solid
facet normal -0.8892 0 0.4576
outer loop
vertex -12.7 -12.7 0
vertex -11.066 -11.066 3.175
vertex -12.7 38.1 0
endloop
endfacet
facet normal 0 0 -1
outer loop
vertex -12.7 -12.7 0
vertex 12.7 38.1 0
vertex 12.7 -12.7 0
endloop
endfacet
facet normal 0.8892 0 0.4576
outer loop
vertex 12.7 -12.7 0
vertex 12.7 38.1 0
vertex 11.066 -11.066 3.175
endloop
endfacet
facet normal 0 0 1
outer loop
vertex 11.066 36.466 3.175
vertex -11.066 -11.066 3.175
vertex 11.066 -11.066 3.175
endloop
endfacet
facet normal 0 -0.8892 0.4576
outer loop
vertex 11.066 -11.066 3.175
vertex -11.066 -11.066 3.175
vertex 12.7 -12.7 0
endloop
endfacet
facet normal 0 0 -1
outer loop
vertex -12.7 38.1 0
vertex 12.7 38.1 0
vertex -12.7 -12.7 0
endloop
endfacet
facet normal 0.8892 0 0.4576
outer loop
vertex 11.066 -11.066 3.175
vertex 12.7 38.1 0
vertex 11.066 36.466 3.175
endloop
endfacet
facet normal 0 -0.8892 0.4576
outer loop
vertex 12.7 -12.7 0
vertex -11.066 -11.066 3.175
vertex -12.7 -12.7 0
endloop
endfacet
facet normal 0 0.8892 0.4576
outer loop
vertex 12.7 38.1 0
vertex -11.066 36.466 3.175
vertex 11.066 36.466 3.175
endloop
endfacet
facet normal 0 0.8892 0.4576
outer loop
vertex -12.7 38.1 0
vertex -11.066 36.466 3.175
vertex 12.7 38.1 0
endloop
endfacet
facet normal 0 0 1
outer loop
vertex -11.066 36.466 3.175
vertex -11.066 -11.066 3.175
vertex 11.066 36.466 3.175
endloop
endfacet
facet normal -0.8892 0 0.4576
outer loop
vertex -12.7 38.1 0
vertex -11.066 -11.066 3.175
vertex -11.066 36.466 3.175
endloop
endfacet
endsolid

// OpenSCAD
//Base Generator for Miniature Wargamers

//Measurements in milimeters or inches?
units=1; // [0:millimeters, 1:inches]
//how wide in mm should the base be?
base_width = 1;
//how deep should the base be? must be equal to or greater than width
base_depth = 2;
//how tall should the base be?
base_height = .125;
//What angle should the sides be? 70 is a good value; use 90 for straight sides
angle= 70;
//what shape?
shape=4; // [4:rectangle, 6:octangle, 80:lozenge]
/* [Base Slot] */
//What kind of slot?
slot_type=0; // [0:none, 1:end to end, 2:corner to corner, 3:end-to-end double]
//How long is the slot?
slot_length = .5;
//How wide is the slot?
slot_width = .09;
//For offset slots, how deep is the offset? (required for double slots)
slot_offset = 0;
/* [Base Indent] */
//% to indent the top surface? (0 for no indent)
base_indent=0;
//% of top surface to indent?
base_indent_area=95;
/* [Central Hole] */
//what shape?
hole_shape=0; // [0:none, 4:diamond, 6:hexagon, 80:round]
//hole diameter?
hole_radius=.35;
/* [Nameplate] */
//What kind of nameplate?
nameplate_type=0; // [0:none, 1:nameplate lengthwise]
//How long is the nameplate?
nameplate_length = 1.5;
//How wide is the nameplate?
nameplate_width = .3;
//Offset how far from the center?
nameplate_offset = .3;
/* [Number of Bases] */
// Number of rows of bases
rows = 1; // [1:10]
// Number of columns of bases
columns = 1; // [1:10]



module base(width, depth, height, side_angle, sides, bslot, slength, swidth, sback, bindent, biarea, hshape, hradius, ntype, nlength, nwidth, noffset)
{

/* [Hidden] */
  $fa=0.5; // default minimum facet angle
  $fs=0.5; // default minimum facet size
  convf = 25.4; // inches to mm

// conversions to metric (if needed)

  bh = units ? height * convf : height;
  bw = units ? width * convf : width;
  bd = units ? depth * convf : depth;
  sl = units ? slength * convf : slength;
  sw = units ? swidth * convf : swidth;   
  sb = units ? sback * convf : sback;   
  hr = units ? hradius * convf : hradius;
  nl = units ? nlength * convf : nlength;
  nw = units ? nwidth * convf : nwidth;   
  npo = units ? noffset * convf : noffset;     
  
// if rectangle, rotate from diamond to rectangle    
    
  rangle = sides == 4 ? 45 : 0;
    
  inset = bh/tan(angle);
  radius1 = sides == 4 ? sqrt(2) * bw / 2 : bw/2;
  radius2 = radius1 - inset * 2;
  diff = sides == 6 ? bd - (sqrt(3) * radius1) : bd - bw;
  offset1 = sides == 4 ? sqrt((diff * diff)/2): 0;
  offset2 = sides == 4 ? sqrt((diff * diff)/2): diff;
  
  
  // slot variables
   
  sangle = (bslot == 2) ? atan(bw/bd) : 0; // angle of slot
  slot_offset = (sb) ? (sides == 4) ? sqrt((sb * sb)/2) : sb : 0;
  
  
  doff = (sides == 6) ? bd/2 - (sqrt(3) * radius1)/2 : bd/2 - bw/2;
  
 
  soffset_x = sqrt(((doff - slot_offset) * (doff - slot_offset))/2);
  soffset_y = sqrt(((doff + slot_offset) * (doff + slot_offset))/2);
  
  np_offset = sqrt(((npo) * (npo))/2);
  
  rotate(rangle)
  {
      difference()
      {
        hull()
        {
        cylinder(r1=radius1, r2=radius2, h=bh, $fn=sides);
        translate([offset1,offset2,0])
          cylinder(r1=radius1, r2=radius2, h=bh, $fn=sides);      
        }

        if (bslot) // if base slot
        {
          if (sides==4)
          {
          translate([soffset_x,soffset_y,bh / 2])        
            color([0,0,1])
              rotate(sangle - 45)
                cube([sw,sl, bh + 4], center=true);
          }
          else
          {
             translate([0 - slot_offset,doff,bh / 2])        
               color([0,0,1])
                 rotate(sangle)
                   cube([sw,sl, bh + 4], center=true);              
          }
        }
        if (bslot == 3) // if double slot
          {
            if (sides == 4)
              translate([soffset_y,soffset_x,bh / 2])
                color([0,0,1])
                  rotate(sangle - 45)
                    cube([sw,sl, bh + 4], center=true);        
            else
              translate([slot_offset, doff, bh / 2])
                color([0,0,1])
                  cube([sw,sl, bh + 4], center=true);              
          }
        if (bindent) // if indented top
          {
            if (sides == 4)
            {
              translate([0,0,bh * (100 - bindent)/100])
                color([0,0,1])
                    hull()
                    {
                      cylinder(r1=radius2 * (biarea)/100, r2=radius2 * (biarea)/100, h=bh, $fn=sides);
                      translate([offset1,offset2,0])
                        cylinder(r1=radius2 * (biarea)/100, r2=radius2 * (biarea)/100, h=bh, $fn=sides);  
                    }
            }    
            else
              translate([0, 0, bh * (100 - bindent)/100])
                color([0,0,1])
                  hull()
                  {
                    cylinder(r1=radius2 * (biarea)/100, r2=radius2 * (biarea)/100, h=bh, $fn=sides);
                    translate([offset1,offset2,0])
                      cylinder(r1=radius2 * (biarea)/100, r2=radius2 * (biarea)/100, h=bh, $fn=sides);              }
          }    
          if (hshape) // if central hole
          {
            if (sides == 4)
            {
              translate([soffset_x,soffset_y,-2])
                rotate(45)
                  color([0,0,1])
                    cylinder(r=hr, h=bh+4, $fn=hshape);
            }    
            else
            {
              translate([0, doff, -2])
                color([0,0,1])
                 cylinder(r=hr, h=bh+4, $fn=hshape);
            }
          }       
      }
      if (nameplate_type)
          if (sides == 4)
            translate([soffset_x - np_offset,soffset_y + np_offset,4])
              rotate(45)
                color([0,0,1])
                  cube([nl,nw, bh], center=true);
          else
              translate([npo,(sides == 6) ? bd/2 - (sqrt(3) * radius1)/2 : bd/2 - bw/2,4])
                rotate(90)
                  color([0,0,1])
                    cube([nl,nw, bh], center=true);

   }
}


module make_x_by_y (x,y)
{
    
/* [Hidden] */
  convf = 25.4; // inches to mm    
    
// conversions to metric (if needed)

  xspace = units ? base_width * convf + 2 : base_width + 2;
  yspace = units ? base_depth * convf + 2 : base_depth + 2;
    
	for (j = [0:y])
    {
		for (i = [0:x])
        {
			translate([i*xspace,j*yspace,0]) children(0);
		}
	}
}

make_x_by_y(rows - 1,columns - 1)
{
	base(base_width, base_depth, base_height, angle, shape, slot_type, slot_length, slot_width, slot_offset, base_indent, base_indent_area, hole_shape, hole_radius, nameplate_type, nameplate_length, nameplate_width, nameplate_offset);
}

// Written in 2016 by Bill Armintrout <http://theminiaturespage.com>
//
// To the extent possible under law, the author(s) have dedicated all
// copyright and related and neighboring rights to this software to the
// public domain worldwide. This software is distributed without any
// warranty.
